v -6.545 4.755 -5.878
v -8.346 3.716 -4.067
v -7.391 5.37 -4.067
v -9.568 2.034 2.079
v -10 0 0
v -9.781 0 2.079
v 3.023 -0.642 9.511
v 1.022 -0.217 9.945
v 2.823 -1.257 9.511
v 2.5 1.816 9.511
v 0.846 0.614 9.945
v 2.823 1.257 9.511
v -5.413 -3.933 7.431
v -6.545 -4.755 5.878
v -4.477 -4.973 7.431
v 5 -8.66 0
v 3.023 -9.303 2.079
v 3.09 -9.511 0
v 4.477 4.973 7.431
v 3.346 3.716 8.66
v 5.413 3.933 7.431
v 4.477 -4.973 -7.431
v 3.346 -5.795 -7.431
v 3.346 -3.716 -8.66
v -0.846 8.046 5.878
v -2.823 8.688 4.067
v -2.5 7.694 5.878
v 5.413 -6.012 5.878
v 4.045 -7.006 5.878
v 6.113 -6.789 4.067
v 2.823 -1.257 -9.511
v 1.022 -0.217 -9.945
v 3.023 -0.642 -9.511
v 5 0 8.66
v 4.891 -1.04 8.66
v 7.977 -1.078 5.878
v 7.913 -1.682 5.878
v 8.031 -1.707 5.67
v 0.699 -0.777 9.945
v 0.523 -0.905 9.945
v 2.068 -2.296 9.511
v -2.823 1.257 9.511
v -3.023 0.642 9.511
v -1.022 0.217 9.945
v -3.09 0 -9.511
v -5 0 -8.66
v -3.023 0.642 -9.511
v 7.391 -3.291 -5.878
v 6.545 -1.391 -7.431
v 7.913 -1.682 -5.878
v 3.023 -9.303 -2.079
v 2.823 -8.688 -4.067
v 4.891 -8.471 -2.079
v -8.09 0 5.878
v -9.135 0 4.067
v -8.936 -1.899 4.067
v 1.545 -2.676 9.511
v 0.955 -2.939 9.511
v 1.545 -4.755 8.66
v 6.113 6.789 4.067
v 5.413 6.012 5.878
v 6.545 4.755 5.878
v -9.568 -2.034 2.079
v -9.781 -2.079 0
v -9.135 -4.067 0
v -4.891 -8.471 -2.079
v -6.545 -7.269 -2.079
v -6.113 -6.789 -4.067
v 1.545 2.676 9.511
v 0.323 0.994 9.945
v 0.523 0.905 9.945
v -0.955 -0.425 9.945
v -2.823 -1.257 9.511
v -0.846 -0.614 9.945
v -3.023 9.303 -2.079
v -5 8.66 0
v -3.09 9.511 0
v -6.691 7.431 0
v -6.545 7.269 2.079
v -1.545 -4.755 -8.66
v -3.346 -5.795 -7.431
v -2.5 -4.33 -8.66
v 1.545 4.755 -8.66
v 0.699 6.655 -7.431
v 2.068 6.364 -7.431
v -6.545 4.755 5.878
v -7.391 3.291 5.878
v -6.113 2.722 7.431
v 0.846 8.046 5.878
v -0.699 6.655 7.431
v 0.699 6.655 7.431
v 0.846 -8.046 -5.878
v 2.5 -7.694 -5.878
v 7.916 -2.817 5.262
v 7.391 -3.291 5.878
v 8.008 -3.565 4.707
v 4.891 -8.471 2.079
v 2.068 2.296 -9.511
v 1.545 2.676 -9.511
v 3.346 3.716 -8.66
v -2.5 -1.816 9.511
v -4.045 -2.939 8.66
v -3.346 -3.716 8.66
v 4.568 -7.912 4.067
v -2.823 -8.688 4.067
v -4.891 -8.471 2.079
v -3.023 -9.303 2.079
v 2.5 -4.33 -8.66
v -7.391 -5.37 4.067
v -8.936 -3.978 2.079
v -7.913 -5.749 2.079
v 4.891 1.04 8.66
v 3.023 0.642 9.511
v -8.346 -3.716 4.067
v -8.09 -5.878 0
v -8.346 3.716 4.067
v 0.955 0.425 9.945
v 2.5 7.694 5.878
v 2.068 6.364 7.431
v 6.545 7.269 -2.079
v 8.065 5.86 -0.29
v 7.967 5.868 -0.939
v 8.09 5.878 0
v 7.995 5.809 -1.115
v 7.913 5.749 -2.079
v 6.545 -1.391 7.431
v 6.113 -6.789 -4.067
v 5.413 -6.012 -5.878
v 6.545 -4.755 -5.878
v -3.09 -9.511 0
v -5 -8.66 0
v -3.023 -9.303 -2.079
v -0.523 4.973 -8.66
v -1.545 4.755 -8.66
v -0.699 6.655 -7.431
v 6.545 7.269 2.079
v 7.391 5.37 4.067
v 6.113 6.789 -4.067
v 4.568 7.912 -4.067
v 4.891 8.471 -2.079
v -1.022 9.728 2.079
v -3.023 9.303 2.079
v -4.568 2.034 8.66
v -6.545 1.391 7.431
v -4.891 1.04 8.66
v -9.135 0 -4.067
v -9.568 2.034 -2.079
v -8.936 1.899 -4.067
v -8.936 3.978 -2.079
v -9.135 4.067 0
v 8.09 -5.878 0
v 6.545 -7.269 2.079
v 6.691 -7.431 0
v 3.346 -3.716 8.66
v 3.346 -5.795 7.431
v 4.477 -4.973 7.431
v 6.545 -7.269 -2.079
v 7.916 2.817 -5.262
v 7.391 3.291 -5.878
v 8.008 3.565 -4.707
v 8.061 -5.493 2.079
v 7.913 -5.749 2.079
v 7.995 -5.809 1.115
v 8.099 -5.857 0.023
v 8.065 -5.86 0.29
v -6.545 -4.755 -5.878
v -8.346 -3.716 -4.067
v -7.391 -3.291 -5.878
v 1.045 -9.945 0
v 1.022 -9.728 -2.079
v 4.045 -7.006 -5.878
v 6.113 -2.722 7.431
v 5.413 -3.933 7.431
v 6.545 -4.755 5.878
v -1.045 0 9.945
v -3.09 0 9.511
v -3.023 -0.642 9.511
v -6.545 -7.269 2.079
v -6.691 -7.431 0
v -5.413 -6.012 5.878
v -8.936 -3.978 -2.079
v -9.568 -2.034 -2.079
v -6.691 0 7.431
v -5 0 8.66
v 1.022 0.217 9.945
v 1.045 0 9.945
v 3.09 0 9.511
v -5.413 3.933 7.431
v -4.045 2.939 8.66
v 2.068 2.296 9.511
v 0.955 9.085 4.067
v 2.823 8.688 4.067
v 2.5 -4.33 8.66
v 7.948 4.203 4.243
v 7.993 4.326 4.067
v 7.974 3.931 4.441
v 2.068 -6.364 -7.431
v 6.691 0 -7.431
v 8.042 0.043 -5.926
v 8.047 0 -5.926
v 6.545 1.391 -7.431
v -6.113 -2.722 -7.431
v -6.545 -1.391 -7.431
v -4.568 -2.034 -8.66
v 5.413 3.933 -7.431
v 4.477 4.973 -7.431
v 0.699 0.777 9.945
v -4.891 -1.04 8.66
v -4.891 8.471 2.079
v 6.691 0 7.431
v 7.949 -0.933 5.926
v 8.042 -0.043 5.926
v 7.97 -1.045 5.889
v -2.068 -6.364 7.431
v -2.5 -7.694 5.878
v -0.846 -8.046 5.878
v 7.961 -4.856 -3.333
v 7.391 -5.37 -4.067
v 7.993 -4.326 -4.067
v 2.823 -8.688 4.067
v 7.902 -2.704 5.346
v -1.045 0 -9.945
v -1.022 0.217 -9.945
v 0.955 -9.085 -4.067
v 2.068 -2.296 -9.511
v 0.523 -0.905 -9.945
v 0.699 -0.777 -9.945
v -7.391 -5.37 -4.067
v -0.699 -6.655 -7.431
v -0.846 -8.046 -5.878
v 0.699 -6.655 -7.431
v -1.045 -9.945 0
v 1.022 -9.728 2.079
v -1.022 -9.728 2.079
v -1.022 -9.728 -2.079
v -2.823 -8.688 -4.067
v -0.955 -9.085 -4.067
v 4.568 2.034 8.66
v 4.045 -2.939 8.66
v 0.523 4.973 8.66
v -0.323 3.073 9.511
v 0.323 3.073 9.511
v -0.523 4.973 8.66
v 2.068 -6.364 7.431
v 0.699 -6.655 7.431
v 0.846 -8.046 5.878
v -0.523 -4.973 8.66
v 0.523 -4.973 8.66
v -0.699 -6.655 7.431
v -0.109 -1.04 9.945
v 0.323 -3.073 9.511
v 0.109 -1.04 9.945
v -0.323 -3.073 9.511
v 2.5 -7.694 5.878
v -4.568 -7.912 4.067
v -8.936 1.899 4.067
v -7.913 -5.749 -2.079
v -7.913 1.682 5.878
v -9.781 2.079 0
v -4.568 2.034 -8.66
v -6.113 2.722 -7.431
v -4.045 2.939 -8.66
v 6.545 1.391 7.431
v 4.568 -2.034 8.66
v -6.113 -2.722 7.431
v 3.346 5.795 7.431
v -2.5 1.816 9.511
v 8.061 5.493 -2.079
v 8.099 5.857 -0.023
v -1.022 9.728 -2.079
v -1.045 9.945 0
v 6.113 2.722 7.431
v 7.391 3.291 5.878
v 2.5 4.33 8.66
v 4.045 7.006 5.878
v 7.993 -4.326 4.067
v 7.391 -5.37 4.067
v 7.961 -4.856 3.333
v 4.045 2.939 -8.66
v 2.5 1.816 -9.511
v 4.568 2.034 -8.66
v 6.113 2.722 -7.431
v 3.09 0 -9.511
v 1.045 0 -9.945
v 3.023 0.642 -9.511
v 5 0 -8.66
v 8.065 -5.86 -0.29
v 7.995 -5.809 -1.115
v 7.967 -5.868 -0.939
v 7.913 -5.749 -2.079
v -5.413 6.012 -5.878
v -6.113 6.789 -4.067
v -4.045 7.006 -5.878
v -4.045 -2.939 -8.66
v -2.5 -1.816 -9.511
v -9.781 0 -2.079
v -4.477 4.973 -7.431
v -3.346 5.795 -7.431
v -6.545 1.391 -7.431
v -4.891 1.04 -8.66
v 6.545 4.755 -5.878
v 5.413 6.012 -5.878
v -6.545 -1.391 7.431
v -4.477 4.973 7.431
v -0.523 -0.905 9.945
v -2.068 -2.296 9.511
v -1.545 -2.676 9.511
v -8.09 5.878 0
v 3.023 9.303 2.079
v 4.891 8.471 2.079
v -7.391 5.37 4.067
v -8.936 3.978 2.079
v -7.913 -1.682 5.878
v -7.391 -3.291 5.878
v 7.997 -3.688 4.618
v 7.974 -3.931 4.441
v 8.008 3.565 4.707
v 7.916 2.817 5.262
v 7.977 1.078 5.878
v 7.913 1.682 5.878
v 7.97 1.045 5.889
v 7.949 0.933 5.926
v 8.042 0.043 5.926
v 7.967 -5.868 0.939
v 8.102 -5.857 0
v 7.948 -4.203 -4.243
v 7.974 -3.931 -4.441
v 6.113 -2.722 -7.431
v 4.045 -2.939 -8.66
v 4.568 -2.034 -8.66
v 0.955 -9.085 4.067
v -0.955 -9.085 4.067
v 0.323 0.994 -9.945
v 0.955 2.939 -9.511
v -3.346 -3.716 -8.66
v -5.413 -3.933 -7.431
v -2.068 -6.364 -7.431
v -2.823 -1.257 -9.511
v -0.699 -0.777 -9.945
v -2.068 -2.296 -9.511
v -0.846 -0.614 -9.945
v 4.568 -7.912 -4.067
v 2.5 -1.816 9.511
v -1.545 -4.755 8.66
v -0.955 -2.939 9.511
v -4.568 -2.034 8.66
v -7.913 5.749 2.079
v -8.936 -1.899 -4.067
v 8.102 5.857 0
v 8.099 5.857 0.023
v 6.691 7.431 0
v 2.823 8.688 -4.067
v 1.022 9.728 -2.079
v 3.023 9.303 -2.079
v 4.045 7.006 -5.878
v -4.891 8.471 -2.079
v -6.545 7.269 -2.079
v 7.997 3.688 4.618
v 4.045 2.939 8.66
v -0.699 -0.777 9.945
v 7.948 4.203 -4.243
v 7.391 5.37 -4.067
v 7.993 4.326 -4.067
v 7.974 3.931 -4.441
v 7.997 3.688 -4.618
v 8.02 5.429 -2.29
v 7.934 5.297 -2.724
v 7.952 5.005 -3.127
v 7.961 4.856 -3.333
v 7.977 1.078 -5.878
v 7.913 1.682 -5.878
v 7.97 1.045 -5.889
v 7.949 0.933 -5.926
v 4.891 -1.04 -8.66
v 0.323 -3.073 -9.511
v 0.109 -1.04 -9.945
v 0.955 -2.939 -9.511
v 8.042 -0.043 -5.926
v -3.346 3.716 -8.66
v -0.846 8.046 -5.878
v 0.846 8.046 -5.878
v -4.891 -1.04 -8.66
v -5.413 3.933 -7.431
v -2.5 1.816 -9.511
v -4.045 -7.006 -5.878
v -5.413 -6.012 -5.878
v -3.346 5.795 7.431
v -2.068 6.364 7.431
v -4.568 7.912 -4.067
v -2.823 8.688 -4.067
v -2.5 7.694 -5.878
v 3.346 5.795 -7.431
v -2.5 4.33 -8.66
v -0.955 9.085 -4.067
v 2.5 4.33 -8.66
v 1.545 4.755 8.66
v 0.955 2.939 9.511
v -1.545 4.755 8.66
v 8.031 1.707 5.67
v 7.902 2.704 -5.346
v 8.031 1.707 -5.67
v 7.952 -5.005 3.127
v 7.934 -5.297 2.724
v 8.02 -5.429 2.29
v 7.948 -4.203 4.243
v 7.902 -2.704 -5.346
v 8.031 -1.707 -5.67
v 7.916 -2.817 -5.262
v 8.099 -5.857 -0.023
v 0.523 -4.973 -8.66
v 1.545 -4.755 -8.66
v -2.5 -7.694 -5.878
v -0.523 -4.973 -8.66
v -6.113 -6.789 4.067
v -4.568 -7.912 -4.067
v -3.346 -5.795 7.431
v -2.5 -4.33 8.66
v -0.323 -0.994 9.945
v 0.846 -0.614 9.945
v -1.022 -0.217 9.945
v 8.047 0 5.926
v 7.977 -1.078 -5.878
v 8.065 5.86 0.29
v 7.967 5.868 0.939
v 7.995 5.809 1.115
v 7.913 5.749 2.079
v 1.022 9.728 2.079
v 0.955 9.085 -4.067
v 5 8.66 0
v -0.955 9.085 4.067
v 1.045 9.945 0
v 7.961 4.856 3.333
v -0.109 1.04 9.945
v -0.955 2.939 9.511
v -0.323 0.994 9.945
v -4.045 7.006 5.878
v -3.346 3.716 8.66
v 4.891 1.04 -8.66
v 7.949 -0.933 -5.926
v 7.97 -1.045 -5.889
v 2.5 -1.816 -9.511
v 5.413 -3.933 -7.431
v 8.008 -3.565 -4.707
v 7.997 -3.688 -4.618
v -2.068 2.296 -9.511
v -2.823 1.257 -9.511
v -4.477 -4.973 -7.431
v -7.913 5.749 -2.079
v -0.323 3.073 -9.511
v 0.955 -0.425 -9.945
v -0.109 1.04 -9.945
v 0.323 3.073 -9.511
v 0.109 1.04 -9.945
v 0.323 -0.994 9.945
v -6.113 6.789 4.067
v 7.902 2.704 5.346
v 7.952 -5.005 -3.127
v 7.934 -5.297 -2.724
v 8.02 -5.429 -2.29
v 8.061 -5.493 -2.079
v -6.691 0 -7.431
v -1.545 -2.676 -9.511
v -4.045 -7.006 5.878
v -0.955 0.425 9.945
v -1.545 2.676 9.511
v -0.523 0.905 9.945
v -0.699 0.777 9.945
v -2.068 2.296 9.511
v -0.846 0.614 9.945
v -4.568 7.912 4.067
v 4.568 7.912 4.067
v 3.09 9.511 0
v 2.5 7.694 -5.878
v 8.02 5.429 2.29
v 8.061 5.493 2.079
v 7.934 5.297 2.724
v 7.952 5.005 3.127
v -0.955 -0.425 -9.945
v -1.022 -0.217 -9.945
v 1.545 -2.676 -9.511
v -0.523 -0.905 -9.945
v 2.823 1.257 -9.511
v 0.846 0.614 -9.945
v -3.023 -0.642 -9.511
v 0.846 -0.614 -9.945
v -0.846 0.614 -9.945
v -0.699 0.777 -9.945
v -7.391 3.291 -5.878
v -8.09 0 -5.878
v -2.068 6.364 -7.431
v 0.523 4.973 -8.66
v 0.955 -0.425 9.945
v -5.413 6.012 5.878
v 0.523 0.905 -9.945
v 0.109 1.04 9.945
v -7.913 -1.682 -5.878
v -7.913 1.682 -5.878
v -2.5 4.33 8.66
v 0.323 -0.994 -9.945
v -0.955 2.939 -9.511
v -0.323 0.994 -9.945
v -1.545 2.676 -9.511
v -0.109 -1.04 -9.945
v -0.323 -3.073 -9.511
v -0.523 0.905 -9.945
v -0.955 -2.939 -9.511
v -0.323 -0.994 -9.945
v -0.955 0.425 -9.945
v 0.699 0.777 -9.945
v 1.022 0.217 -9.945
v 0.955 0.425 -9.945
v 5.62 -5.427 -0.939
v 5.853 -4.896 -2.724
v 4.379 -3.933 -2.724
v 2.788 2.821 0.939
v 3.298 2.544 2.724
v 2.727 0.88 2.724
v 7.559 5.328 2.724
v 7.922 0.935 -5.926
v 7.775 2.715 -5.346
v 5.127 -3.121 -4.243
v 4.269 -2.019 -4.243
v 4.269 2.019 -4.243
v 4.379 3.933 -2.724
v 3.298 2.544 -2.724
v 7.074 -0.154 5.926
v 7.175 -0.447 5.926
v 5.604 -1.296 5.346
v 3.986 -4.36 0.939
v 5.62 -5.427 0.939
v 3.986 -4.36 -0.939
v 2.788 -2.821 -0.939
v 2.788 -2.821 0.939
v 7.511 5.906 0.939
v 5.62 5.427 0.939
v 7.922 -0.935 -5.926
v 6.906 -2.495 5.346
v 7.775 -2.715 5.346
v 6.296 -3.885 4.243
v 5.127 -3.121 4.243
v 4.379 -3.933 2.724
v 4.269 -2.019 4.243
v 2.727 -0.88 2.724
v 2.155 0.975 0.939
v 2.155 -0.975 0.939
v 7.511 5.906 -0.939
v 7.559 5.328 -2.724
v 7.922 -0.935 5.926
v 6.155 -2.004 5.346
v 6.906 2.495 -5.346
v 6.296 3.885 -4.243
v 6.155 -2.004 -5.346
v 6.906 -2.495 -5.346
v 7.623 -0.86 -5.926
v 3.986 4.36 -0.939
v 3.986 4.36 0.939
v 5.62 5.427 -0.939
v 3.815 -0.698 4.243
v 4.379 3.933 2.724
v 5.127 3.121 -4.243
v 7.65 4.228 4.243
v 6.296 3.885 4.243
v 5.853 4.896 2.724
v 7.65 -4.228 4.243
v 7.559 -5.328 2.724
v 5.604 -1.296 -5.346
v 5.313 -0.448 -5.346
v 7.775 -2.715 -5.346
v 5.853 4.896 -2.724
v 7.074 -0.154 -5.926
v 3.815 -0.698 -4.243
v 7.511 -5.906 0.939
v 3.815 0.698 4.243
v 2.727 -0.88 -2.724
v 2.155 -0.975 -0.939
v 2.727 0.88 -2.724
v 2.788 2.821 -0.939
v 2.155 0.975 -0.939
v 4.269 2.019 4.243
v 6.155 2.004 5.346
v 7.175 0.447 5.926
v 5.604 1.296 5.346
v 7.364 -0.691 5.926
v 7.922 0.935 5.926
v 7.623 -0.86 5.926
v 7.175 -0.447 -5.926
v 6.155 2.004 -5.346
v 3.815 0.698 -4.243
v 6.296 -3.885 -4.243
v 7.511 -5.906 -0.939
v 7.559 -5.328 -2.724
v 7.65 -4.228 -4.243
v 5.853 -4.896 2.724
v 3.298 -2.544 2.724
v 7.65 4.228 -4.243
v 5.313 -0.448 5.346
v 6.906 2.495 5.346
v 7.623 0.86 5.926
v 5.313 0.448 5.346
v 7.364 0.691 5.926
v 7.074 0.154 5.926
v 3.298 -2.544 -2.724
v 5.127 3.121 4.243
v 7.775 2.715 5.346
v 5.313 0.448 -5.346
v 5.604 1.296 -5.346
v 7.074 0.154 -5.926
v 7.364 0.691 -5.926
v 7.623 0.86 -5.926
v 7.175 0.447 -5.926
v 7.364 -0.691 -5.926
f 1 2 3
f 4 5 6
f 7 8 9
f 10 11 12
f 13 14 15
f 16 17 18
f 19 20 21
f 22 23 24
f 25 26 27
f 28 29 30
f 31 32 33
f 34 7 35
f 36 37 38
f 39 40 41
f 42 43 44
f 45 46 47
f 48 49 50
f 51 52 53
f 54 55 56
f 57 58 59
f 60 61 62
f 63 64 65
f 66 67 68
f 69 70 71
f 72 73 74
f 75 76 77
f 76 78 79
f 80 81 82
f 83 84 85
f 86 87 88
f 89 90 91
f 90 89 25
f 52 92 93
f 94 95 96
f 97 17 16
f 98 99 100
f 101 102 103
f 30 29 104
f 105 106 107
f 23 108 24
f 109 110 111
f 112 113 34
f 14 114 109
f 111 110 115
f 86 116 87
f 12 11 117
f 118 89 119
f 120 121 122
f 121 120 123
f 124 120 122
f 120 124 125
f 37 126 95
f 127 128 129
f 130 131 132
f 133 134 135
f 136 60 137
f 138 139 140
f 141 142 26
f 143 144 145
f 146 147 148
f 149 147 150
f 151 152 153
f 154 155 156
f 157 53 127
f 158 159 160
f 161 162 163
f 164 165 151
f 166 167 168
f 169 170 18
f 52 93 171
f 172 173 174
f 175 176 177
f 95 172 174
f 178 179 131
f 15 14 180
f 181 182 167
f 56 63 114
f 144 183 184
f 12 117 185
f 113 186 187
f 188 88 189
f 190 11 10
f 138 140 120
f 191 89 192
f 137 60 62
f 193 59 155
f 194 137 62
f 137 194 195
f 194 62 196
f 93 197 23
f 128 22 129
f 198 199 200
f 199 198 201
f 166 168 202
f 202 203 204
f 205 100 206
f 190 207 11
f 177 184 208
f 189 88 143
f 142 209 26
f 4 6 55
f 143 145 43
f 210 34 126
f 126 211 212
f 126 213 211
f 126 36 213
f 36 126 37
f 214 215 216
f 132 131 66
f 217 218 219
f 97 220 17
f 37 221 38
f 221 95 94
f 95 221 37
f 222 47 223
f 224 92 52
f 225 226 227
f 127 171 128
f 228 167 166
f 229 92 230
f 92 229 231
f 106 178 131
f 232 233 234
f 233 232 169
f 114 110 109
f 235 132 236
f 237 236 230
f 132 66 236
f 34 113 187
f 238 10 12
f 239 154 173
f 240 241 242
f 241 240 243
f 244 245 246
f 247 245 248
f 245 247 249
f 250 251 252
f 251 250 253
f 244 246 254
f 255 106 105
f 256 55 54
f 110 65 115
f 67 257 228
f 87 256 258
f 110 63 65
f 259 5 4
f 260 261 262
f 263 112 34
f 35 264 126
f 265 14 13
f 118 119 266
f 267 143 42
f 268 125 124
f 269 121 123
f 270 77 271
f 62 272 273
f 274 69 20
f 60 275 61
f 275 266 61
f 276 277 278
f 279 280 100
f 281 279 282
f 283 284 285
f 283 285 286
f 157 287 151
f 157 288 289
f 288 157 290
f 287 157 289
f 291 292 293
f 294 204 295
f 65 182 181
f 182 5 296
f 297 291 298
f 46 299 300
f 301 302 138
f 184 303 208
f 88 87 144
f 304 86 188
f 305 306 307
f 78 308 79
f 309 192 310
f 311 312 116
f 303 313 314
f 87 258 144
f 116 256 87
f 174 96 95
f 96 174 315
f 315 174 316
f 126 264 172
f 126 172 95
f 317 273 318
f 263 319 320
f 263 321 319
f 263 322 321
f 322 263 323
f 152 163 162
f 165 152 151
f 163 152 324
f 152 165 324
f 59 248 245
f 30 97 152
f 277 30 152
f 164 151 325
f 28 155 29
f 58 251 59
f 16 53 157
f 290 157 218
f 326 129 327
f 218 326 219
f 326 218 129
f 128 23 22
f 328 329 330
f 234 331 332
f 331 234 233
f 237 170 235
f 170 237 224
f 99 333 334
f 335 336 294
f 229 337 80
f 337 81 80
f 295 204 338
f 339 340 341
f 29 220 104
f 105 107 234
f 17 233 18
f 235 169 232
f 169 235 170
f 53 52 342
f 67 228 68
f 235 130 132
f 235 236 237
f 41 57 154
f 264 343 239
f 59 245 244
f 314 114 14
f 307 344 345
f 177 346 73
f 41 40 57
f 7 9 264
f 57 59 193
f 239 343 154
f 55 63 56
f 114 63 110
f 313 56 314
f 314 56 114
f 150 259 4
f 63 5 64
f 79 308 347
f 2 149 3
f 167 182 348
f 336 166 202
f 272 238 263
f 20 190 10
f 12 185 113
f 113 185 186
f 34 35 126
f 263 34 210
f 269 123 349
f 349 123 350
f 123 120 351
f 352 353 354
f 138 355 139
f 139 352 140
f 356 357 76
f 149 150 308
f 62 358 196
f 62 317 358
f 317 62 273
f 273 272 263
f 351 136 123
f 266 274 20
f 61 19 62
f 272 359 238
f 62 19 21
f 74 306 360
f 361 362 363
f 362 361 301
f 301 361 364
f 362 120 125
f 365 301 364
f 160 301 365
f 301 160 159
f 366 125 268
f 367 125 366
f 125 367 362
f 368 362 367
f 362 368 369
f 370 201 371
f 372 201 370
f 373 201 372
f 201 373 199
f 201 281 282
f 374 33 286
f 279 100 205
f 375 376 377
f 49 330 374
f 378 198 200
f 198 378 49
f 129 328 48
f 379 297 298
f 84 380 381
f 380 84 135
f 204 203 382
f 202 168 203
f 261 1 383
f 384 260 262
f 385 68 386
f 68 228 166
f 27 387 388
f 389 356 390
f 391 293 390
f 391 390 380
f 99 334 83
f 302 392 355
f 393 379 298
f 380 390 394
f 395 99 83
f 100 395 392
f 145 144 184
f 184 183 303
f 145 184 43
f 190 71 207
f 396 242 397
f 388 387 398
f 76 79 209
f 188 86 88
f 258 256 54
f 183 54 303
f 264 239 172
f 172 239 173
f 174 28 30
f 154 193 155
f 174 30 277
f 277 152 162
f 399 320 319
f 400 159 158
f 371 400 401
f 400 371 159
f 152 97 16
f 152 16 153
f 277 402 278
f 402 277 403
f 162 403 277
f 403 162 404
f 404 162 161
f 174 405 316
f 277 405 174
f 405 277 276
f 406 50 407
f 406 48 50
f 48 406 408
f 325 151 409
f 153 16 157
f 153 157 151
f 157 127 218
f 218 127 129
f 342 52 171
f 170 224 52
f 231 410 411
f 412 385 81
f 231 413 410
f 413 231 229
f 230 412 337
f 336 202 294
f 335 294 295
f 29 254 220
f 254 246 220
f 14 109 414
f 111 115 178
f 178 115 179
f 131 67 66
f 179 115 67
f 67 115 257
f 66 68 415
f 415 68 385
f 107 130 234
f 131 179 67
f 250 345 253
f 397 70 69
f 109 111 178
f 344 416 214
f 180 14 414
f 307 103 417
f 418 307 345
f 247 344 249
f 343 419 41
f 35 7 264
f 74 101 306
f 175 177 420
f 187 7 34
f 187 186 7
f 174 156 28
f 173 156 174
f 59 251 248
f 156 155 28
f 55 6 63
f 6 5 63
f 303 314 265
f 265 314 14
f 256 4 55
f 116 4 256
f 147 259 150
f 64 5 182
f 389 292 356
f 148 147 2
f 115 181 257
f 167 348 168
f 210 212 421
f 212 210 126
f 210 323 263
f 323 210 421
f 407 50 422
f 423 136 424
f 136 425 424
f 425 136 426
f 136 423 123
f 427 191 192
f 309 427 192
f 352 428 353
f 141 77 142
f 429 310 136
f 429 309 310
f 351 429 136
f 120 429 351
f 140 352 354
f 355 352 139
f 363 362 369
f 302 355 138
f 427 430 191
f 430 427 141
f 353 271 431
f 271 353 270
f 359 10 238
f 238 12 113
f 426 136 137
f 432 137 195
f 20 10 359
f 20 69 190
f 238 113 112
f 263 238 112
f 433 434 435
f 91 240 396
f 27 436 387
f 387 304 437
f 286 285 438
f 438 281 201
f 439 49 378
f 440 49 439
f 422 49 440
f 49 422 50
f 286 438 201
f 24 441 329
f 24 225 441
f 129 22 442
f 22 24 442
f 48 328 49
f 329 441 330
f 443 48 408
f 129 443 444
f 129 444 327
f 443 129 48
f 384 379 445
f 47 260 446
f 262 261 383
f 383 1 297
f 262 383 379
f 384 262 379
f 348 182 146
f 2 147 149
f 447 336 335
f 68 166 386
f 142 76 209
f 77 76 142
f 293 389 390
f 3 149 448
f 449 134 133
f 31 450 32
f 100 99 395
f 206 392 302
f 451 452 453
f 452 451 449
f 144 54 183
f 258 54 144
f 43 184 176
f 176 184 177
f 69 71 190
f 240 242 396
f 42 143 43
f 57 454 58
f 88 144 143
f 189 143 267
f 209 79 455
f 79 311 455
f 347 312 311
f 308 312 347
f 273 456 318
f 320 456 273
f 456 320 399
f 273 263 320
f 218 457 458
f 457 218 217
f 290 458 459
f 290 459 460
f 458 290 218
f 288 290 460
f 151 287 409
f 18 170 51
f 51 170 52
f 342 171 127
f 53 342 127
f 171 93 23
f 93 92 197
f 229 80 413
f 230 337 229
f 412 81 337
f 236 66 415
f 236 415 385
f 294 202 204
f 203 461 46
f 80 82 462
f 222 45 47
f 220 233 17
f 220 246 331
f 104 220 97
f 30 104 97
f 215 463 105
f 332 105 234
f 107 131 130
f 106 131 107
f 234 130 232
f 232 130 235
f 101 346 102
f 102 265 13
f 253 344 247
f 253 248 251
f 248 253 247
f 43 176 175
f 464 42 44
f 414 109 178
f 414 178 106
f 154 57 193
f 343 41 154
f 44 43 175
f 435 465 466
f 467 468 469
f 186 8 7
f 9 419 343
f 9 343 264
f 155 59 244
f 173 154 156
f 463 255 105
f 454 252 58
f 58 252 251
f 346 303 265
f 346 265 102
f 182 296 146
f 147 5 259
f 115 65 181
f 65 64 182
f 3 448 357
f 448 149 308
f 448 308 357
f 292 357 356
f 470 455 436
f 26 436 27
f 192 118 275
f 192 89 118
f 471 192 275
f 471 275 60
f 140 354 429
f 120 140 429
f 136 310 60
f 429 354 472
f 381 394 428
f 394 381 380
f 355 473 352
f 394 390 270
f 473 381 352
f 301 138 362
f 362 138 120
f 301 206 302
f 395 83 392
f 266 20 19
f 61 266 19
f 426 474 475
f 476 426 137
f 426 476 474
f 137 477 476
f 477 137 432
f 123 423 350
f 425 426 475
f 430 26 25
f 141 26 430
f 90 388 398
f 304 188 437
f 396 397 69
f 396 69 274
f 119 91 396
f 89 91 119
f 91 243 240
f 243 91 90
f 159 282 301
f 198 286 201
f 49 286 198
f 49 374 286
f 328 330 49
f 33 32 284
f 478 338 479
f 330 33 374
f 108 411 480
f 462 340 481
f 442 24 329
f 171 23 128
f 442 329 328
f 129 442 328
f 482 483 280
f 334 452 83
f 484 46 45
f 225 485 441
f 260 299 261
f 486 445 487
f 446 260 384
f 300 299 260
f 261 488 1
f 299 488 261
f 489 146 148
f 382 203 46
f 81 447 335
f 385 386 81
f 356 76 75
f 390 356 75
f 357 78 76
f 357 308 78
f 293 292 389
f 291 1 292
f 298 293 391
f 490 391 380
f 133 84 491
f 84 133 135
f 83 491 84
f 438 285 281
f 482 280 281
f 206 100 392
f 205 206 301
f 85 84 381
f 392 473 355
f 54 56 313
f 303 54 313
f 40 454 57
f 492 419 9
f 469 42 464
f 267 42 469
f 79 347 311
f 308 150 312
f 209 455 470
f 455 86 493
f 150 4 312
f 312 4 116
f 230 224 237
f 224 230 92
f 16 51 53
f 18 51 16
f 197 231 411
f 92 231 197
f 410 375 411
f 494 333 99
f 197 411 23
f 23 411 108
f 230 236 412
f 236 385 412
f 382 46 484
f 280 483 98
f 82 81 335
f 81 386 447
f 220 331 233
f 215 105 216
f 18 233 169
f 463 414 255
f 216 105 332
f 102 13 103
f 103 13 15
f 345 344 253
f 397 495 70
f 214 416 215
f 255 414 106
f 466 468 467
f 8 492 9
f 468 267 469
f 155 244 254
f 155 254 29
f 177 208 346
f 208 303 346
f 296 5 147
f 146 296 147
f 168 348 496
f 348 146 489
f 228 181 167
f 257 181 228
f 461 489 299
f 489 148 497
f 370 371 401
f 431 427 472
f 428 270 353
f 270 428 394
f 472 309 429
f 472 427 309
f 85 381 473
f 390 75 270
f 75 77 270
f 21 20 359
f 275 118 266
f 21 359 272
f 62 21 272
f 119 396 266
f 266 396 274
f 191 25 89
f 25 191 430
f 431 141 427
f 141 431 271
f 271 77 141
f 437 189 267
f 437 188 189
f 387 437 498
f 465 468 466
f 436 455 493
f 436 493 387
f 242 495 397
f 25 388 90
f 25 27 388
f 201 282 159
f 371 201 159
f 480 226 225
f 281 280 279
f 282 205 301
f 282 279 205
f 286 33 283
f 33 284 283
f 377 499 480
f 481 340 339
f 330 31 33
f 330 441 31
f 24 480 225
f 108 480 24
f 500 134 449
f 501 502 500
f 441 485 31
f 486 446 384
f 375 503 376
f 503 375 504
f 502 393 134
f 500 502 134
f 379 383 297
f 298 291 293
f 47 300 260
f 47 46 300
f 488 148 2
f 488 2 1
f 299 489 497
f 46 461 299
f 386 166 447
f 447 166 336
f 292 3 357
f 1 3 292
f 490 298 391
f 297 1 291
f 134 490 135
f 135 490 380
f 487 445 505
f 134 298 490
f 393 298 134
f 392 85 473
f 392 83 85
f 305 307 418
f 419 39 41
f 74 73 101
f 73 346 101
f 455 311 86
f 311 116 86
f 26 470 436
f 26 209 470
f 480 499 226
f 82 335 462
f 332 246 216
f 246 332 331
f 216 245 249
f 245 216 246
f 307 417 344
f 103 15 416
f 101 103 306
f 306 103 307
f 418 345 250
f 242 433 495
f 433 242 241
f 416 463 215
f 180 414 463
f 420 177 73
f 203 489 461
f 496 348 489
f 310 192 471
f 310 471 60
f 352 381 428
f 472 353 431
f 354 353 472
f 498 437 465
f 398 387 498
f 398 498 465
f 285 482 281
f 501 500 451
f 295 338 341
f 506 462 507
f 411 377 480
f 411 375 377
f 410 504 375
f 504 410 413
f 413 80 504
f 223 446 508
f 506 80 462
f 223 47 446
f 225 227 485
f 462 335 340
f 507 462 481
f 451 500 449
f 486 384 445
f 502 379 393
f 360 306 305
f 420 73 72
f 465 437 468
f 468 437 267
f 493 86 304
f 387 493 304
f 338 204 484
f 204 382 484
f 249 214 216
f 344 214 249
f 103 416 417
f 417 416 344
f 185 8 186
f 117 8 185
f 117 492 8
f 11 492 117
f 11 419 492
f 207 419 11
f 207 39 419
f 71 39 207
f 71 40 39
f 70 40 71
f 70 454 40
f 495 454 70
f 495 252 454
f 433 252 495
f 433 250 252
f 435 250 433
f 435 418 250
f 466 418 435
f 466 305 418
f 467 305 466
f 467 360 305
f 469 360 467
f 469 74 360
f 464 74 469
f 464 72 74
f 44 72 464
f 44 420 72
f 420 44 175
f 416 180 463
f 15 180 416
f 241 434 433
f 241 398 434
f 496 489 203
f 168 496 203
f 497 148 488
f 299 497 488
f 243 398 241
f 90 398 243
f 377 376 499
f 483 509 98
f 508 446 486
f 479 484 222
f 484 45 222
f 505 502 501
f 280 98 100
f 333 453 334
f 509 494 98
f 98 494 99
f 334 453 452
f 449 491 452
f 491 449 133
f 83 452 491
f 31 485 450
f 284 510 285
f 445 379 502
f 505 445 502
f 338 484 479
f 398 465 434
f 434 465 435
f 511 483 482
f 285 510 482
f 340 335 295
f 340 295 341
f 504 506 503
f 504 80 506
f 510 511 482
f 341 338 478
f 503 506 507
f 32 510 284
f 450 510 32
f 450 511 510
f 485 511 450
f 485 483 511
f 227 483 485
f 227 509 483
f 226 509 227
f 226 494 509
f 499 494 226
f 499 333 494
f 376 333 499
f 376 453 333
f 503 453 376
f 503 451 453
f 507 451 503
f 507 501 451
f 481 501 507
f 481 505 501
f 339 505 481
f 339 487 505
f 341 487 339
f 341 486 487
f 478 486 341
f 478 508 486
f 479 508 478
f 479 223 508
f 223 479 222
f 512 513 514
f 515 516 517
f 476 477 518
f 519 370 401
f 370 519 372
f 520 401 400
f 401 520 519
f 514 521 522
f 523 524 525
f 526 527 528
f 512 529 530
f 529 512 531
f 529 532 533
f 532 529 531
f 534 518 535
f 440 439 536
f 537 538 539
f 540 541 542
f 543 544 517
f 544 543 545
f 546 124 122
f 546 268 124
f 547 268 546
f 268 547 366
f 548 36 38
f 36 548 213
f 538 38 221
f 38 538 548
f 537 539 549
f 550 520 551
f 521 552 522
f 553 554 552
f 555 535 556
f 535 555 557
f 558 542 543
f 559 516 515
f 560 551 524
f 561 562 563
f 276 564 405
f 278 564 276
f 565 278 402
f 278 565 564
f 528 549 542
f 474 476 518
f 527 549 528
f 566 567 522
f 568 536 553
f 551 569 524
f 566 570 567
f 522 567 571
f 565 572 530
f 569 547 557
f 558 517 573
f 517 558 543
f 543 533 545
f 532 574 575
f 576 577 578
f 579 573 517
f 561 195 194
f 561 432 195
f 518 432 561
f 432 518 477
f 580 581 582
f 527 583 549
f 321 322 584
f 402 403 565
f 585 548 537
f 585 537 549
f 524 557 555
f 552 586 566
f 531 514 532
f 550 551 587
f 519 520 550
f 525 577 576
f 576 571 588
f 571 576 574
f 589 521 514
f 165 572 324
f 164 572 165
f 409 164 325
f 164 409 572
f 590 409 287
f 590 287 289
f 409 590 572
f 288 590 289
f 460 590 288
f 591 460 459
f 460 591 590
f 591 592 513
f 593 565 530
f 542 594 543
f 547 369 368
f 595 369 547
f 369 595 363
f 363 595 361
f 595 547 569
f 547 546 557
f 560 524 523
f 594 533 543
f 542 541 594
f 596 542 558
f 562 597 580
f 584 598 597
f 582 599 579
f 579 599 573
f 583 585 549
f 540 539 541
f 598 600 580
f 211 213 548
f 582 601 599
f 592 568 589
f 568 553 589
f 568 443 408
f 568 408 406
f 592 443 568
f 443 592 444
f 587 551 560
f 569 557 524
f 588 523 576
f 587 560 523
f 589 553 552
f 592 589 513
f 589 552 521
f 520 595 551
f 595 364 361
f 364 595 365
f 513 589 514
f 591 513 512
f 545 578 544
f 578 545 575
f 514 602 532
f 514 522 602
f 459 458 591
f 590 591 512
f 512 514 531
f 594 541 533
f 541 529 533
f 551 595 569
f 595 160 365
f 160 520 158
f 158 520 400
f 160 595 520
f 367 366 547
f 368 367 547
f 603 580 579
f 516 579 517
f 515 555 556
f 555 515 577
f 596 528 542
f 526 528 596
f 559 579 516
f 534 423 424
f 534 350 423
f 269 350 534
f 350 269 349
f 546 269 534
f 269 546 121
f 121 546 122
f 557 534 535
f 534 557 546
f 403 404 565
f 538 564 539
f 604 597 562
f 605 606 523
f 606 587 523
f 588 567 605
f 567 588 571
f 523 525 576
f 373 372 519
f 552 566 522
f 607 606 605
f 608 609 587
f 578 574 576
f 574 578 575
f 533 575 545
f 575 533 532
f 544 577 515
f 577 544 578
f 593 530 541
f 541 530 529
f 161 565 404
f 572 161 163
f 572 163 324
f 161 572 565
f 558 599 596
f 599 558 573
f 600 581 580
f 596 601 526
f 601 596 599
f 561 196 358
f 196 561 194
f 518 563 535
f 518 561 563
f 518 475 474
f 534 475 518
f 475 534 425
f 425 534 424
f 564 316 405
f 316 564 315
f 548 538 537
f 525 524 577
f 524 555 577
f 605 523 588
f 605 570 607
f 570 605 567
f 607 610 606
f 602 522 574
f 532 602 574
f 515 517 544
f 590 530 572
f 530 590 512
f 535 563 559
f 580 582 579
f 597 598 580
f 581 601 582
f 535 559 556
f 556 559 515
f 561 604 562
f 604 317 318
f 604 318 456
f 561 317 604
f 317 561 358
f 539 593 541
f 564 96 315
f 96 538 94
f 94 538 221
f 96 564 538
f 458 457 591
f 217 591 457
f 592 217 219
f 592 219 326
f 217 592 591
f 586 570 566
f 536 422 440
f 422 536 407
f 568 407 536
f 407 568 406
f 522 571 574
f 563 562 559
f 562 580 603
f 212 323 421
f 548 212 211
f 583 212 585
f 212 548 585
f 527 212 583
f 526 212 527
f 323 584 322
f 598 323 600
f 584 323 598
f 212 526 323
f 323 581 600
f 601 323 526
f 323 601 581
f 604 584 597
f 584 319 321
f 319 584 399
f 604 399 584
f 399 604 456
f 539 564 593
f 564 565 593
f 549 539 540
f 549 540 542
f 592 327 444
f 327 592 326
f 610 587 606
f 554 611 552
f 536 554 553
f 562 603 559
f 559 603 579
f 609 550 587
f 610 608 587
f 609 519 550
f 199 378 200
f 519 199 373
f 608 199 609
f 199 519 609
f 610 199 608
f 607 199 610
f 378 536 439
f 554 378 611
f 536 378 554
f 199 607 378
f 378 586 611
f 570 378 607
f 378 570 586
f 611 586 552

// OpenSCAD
// The exact-geometry audit's case c13 (docs/audits/exact-geometry-rust.md).
// volume: 3619.1147369354417
difference() { sphere(10); translate([8,0,0]) sphere(6); }
